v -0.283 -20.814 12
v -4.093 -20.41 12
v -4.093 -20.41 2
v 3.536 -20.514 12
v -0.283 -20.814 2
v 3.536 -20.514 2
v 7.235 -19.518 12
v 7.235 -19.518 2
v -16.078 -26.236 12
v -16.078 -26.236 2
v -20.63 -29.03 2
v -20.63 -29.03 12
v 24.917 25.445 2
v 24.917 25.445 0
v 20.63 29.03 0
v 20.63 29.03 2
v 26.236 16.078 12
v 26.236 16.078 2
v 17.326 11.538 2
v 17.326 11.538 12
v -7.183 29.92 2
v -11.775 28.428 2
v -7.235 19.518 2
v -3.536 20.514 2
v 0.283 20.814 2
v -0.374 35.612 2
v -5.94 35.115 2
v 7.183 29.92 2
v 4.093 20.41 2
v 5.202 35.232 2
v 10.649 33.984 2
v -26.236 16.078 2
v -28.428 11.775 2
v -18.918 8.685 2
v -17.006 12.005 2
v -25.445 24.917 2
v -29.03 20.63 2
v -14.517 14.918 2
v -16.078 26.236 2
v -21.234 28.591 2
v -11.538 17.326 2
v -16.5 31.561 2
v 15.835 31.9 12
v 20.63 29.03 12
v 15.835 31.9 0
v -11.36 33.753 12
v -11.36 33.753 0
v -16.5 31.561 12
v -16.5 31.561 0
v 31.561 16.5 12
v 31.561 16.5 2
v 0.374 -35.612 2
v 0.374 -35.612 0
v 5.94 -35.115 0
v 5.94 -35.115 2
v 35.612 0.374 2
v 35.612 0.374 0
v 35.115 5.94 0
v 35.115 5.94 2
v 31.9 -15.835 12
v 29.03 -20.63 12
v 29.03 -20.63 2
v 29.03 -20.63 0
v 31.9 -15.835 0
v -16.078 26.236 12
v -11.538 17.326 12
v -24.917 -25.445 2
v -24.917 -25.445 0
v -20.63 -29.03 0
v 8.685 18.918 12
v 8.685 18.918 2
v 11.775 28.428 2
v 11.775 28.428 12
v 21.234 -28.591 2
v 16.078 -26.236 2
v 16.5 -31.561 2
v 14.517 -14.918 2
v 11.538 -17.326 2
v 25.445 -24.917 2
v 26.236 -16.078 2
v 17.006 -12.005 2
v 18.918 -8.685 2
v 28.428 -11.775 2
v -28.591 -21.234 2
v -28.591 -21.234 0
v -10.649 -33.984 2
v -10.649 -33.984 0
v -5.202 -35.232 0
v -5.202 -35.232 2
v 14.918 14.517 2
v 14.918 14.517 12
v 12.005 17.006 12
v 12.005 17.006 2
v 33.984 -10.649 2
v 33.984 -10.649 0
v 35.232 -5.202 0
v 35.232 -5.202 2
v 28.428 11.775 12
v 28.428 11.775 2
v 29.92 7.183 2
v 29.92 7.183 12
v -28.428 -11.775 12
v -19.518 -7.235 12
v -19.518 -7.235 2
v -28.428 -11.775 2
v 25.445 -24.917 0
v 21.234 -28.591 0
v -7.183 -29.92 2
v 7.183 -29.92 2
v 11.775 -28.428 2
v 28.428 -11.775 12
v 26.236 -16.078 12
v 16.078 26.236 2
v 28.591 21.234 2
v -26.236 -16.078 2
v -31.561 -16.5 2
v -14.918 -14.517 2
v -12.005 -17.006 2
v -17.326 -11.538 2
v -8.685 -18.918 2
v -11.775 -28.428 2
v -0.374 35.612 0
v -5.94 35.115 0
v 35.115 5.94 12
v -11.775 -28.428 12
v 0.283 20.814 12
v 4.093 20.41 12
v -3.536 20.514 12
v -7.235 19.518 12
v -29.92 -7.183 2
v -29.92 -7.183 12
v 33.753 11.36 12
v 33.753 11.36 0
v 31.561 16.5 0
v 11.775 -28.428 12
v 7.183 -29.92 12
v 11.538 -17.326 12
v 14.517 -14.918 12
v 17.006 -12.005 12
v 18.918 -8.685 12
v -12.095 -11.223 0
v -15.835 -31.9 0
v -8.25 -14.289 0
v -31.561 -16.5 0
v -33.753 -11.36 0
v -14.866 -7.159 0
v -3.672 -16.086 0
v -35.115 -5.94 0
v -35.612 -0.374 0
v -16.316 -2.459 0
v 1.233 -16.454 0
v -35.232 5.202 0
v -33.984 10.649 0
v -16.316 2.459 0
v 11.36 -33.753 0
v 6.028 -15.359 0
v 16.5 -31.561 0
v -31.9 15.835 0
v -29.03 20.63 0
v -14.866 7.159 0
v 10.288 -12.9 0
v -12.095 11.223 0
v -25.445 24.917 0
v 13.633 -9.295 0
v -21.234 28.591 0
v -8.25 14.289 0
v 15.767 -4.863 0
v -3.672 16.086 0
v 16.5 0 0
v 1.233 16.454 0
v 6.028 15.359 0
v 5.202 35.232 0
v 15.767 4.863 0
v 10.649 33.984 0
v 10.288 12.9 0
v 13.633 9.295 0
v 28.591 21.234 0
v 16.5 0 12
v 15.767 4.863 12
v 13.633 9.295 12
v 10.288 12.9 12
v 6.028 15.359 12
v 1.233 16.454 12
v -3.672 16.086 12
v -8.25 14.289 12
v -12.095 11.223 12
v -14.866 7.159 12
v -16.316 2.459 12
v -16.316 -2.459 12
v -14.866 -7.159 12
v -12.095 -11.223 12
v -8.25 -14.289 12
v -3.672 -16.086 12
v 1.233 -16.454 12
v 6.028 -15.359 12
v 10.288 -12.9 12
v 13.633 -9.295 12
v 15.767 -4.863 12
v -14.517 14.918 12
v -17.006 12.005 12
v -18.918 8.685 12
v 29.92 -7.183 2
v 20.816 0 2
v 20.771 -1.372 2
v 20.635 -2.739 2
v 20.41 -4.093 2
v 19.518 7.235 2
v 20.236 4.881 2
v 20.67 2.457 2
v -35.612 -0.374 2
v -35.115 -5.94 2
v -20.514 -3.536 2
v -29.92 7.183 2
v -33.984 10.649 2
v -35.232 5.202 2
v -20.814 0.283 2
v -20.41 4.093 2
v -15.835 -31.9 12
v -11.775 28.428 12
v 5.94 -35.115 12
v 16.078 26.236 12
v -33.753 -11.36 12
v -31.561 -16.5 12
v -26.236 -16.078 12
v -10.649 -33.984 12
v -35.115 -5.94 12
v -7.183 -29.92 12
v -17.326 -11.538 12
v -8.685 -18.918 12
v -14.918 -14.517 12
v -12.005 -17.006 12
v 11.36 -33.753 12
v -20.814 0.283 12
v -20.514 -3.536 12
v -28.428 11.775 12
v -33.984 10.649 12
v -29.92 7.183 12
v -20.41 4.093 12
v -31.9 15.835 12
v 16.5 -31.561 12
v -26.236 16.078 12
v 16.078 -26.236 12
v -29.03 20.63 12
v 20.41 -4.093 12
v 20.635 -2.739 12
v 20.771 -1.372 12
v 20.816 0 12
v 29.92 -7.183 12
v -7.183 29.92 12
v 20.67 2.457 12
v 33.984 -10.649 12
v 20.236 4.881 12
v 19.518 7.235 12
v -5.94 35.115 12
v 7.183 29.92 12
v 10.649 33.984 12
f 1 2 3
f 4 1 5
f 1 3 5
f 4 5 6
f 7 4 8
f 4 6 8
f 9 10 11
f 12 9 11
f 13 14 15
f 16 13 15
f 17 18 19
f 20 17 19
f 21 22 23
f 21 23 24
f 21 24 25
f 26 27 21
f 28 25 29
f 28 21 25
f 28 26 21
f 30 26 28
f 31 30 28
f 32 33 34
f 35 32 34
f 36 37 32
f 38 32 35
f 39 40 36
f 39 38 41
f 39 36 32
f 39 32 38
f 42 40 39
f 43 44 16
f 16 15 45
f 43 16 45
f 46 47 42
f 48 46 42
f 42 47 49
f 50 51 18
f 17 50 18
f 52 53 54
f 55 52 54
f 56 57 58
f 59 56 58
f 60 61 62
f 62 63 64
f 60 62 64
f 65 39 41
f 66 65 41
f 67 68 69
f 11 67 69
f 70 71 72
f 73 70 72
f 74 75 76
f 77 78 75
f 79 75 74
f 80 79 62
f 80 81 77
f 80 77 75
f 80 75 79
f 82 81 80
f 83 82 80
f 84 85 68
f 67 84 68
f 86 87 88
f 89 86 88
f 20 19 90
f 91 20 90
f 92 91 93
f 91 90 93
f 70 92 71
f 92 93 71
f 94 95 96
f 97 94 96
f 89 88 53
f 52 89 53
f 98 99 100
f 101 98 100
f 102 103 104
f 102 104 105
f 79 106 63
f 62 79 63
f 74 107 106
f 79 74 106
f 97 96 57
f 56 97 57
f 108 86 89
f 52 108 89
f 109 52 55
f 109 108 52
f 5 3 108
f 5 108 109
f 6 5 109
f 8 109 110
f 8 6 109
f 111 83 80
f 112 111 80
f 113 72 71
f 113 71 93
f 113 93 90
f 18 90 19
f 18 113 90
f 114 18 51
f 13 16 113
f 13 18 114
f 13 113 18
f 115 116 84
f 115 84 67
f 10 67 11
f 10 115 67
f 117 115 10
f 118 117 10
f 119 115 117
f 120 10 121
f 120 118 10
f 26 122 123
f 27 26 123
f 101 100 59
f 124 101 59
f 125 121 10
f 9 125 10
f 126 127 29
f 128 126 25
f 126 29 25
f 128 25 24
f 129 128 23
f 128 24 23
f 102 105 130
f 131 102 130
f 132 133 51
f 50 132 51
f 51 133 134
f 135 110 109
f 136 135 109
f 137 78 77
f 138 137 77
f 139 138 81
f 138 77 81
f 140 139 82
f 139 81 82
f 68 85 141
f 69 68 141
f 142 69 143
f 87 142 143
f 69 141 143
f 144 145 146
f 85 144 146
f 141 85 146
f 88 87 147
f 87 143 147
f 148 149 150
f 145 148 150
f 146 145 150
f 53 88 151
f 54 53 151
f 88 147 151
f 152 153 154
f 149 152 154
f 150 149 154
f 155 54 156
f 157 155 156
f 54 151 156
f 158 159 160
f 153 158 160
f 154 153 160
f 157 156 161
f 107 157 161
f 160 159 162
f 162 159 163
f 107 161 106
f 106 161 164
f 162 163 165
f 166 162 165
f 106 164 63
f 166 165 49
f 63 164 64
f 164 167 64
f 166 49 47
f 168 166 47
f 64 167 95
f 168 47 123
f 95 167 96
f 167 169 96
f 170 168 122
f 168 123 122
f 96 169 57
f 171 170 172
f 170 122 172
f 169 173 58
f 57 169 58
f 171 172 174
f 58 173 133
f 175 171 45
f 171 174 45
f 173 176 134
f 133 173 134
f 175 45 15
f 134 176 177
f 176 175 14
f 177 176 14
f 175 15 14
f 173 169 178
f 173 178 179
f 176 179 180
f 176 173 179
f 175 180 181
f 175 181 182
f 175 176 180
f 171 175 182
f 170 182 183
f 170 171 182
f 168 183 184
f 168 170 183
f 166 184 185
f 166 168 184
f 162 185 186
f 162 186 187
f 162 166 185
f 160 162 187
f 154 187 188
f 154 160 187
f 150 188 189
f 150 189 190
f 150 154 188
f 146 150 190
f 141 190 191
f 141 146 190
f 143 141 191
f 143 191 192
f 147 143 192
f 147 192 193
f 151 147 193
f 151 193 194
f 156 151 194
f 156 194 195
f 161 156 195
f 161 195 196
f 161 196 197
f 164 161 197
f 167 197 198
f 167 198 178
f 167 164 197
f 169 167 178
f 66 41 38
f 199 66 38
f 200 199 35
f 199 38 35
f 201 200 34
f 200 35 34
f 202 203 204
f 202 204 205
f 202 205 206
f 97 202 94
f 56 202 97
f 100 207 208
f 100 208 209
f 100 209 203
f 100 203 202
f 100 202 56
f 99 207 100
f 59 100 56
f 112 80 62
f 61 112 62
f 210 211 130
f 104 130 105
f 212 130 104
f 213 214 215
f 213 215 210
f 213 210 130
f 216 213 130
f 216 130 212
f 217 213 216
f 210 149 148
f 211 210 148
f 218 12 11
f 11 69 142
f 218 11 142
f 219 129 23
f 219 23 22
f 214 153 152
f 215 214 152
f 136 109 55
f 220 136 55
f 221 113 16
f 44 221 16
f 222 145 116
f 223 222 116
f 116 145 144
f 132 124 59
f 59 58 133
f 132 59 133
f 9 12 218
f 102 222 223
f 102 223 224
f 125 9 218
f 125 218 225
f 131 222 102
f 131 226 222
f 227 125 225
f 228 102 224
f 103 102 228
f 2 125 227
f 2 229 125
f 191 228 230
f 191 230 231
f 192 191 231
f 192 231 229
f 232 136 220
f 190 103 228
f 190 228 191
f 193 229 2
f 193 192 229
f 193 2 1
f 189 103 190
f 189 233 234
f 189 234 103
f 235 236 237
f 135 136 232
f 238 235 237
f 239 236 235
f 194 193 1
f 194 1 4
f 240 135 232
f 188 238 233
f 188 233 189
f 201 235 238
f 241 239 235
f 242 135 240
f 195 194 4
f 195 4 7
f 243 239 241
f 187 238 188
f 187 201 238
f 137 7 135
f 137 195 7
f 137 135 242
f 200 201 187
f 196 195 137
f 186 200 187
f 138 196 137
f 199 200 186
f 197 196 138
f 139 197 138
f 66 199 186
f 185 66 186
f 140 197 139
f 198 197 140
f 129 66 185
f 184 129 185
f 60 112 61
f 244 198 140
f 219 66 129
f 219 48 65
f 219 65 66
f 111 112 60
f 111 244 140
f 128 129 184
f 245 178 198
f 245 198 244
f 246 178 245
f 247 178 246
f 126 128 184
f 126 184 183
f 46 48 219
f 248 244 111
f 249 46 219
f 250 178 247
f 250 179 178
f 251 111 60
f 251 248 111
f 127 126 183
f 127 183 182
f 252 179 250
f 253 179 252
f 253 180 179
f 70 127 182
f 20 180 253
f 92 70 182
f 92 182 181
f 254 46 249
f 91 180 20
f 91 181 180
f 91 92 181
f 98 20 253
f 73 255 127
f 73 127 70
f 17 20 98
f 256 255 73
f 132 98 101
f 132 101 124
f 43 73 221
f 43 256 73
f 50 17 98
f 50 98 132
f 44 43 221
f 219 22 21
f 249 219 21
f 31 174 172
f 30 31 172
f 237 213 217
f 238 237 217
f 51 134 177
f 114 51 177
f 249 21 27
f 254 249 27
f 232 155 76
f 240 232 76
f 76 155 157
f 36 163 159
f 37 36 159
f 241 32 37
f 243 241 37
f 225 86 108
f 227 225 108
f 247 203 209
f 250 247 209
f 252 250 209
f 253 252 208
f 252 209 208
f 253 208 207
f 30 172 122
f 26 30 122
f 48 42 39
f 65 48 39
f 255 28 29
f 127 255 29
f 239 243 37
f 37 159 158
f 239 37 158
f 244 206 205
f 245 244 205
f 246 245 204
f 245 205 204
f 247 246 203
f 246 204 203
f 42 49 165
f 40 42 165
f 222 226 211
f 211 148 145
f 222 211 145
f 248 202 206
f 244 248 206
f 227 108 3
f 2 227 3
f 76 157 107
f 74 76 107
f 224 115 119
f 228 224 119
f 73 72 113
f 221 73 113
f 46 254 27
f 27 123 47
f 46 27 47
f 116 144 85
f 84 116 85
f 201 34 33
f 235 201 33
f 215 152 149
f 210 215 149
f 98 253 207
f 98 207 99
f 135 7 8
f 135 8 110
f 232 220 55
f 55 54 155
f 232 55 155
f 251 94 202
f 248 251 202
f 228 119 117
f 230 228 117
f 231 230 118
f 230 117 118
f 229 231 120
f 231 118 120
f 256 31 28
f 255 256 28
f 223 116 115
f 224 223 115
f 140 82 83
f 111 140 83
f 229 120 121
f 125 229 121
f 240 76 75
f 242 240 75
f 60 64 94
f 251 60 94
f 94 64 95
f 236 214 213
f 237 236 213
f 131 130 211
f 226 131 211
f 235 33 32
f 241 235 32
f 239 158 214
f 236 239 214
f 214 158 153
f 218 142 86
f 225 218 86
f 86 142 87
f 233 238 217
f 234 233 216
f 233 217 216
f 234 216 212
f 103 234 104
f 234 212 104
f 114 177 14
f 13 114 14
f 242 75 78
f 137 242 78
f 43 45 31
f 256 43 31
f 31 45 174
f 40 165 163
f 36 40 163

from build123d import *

# Parameters (mm, degrees)
F0_R      = 16.5
F17_DEPTH = 12
F18_DEPTH = 2


with BuildPart() as f17:
    # F0 (on Top) → F17 (new body)
    with BuildSketch(Plane.XY):
        with BuildLine():
            ThreePointArc((18.917614, -8.685167), (19.797247, -6.432516), (20.409685, -4.093046))
            ThreePointArc((20.409685, -4.093046), (20.714215, -2.056585), (20.816058, 0))
            ThreePointArc((20.816058, 0), (20.489002, 3.675464), (19.518114, 7.235432))
            ThreePointArc((19.518114, 7.235432), (18.547243, 9.450292), (17.326047, 11.537605))
            ThreePointArc((17.326047, 11.537605), (13.518948, 15.828654), (8.685167, 18.917614))
            ThreePointArc((8.685167, 18.917614), (6.432516, 19.797247), (4.093046, 20.409685))
            ThreePointArc((4.093046, 20.409685), (-1.633209, 20.751889), (-7.235432, 19.518114))
            ThreePointArc((-7.235432, 19.518114), (-9.450292, 18.547243), (-11.537605, 17.326047))
            ThreePointArc((-11.537605, 17.326047), (-15.828654, 13.518948), (-18.917614, 8.685167))
            ThreePointArc((-18.917614, 8.685167), (-19.797247, 6.432516), (-20.409685, 4.093046))
            ThreePointArc((-20.409685, 4.093046), (-20.751889, -1.633209), (-19.518114, -7.235432))
            ThreePointArc((-19.518114, -7.235432), (-18.547243, -9.450292), (-17.326047, -11.537605))
            ThreePointArc((-17.326047, -11.537605), (-13.518948, -15.828654), (-8.685167, -18.917614))
            ThreePointArc((-8.685167, -18.917614), (-6.432516, -19.797247), (-4.093046, -20.409685))
            ThreePointArc((-4.093046, -20.409685), (1.633209, -20.751889), (7.235432, -19.518114))
            ThreePointArc((7.235432, -19.518114), (9.450292, -18.547243), (11.537605, -17.326047))
            ThreePointArc((11.537605, -17.326047), (15.828654, -13.518948), (18.917614, -8.685167))
        make_face()
        Circle(F0_R, mode=Mode.SUBTRACT)
        with BuildLine():
            ThreePointArc((4.093046, 20.409685), (6.432516, 19.797247), (8.685167, 18.917614))
            Line((8.685167, 18.917614), (11.775337, 28.428179))
            Line((11.775337, 28.428179), (7.183216, 29.92025))
            Line((7.183216, 29.92025), (4.093046, 20.409685))
        make_face()
        Polygon((11.775337, 28.428179), (16.07751, 26.236113), (20.629834, 29.030011), (15.834552, 31.89982), (10.649371, 33.98415), (7.183216, 29.92025), align=None)
        Polygon((-16.07751, 26.236113), (-11.775337, 28.428179), (-7.183216, 29.92025), (-5.939822, 35.114813), (-11.35986, 33.753298), (-16.50018, 31.560666), align=None)
        with BuildLine():
            ThreePointArc((-11.537605, 17.326047), (-9.450292, 18.547243), (-7.235432, 19.518114))
            Line((-7.235432, 19.518114), (-11.775337, 28.428179))
            Line((-11.775337, 28.428179), (-16.07751, 26.236113))
            Line((-16.07751, 26.236113), (-11.537605, 17.326047))
        make_face()
        Polygon((-29.92025, 7.183216), (-28.428179, 11.775337), (-26.236113, 16.07751), (-29.030011, 20.629834), (-31.89982, 15.834552), (-33.98415, 10.649371), align=None)
        with BuildLine():
            ThreePointArc((-20.409685, 4.093046), (-19.797247, 6.432516), (-18.917614, 8.685167))
            Line((-18.917614, 8.685167), (-28.428179, 11.775337))
            Line((-28.428179, 11.775337), (-29.92025, 7.183216))
            Line((-29.92025, 7.183216), (-20.409685, 4.093046))
        make_face()
        Polygon((-31.560666, -16.50018), (-26.236113, -16.07751), (-28.428179, -11.775337), (-29.92025, -7.183216), (-35.114813, -5.939822), (-33.753298, -11.35986), align=None)
        with BuildLine():
            Line((-26.236113, -16.07751), (-17.326047, -11.537605))
            ThreePointArc((-17.326047, -11.537605), (-18.547243, -9.450292), (-19.518114, -7.235432))
            Line((-19.518114, -7.235432), (-28.428179, -11.775337))
            Line((-28.428179, -11.775337), (-26.236113, -16.07751))
        make_face()
        Polygon((-10.649371, -33.98415), (-7.183216, -29.92025), (-11.775337, -28.428179), (-16.07751, -26.236113), (-20.629834, -29.030011), (-15.834552, -31.89982), align=None)
        with BuildLine():
            Line((-7.183216, -29.92025), (-4.093046, -20.409685))
            ThreePointArc((-4.093046, -20.409685), (-6.432516, -19.797247), (-8.685167, -18.917614))
            Line((-8.685167, -18.917614), (-11.775337, -28.428179))
            Line((-11.775337, -28.428179), (-7.183216, -29.92025))
        make_face()
        Polygon((16.50018, -31.560666), (16.07751, -26.236113), (11.775337, -28.428179), (7.183216, -29.92025), (5.939822, -35.114813), (11.35986, -33.753298), align=None)
        with BuildLine():
            Line((16.07751, -26.236113), (11.537605, -17.326047))
            ThreePointArc((11.537605, -17.326047), (9.450292, -18.547243), (7.235432, -19.518114))
            Line((7.235432, -19.518114), (11.775337, -28.428179))
            Line((11.775337, -28.428179), (16.07751, -26.236113))
        make_face()
        Polygon((33.98415, -10.649371), (29.92025, -7.183216), (28.428179, -11.775337), (26.236113, -16.07751), (29.030011, -20.629834), (31.89982, -15.834552), align=None)
        with BuildLine():
            Line((28.428179, -11.775337), (29.92025, -7.183216))
            Line((29.92025, -7.183216), (20.409685, -4.093046))
            ThreePointArc((20.409685, -4.093046), (19.797247, -6.432516), (18.917614, -8.685167))
            Line((18.917614, -8.685167), (28.428179, -11.775337))
        make_face()
        Polygon((28.428179, 11.775337), (29.92025, 7.183216), (35.114813, 5.939822), (33.753298, 11.35986), (31.560666, 16.50018), (26.236113, 16.07751), align=None)
        with BuildLine():
            Line((19.518114, 7.235432), (28.428179, 11.775337))
            Line((28.428179, 11.775337), (26.236113, 16.07751))
            Line((26.236113, 16.07751), (17.326047, 11.537605))
            ThreePointArc((17.326047, 11.537605), (18.547243, 9.450292), (19.518114, 7.235432))
        make_face()
    extrude(amount=F17_DEPTH)

    # F9 (on face) + F10 (on face) + F11 (on face) + F7 (on face) + F8 (on face) + F1 (on face) + F2 (on face) + F16 (on face) + F15 (on face) + F3 (on face) + F14 (on face) + F4 (on face) + F13 (on face) + F5 (on face) + F12 (on face) + F6 (on face) → F18 (join)
    with BuildSketch(Plane.XY):
        Polygon((-23.398026, 19.983802), (-19.983802, 23.398026), (-16.07751, 26.236113), (-16.50018, 31.560666), (-21.234212, 28.590905), (-25.445386, 24.917141), (-29.030011, 20.629834), (-26.236113, 16.07751), align=None)
    with BuildSketch(Plane.XY):
        Polygon((-2.414221, 30.675584), (2.414221, 30.675584), (7.183216, 29.92025), (10.649371, 33.98415), (5.201968, 35.231677), (-0.373526, 35.611684), (-5.939822, 35.114813), (-7.183216, 29.92025), align=None)
    with BuildSketch(Plane.XY):
        Polygon((19.983802, 23.398026), (23.398026, 19.983802), (26.236113, 16.07751), (31.560666, 16.50018), (28.590905, 21.234212), (24.917141, 25.445386), (20.629834, 29.030011), (16.07751, 26.236113), align=None)
    with BuildSketch(Plane.XY):
        with BuildLine():
            ThreePointArc((8.685167, 18.917614), (13.518948, 15.828654), (17.326047, 11.537605))
            Line((17.326047, 11.537605), (26.236113, 16.07751))
            Line((26.236113, 16.07751), (23.398026, 19.983802))
            Line((23.398026, 19.983802), (19.983802, 23.398026))
            Line((19.983802, 23.398026), (16.07751, 26.236113))
            Line((16.07751, 26.236113), (11.775337, 28.428179))
            Line((11.775337, 28.428179), (8.685167, 18.917614))
        make_face()
    with BuildSketch(Plane.XY):
        with BuildLine():
            Line((-11.775337, 28.428179), (-7.235432, 19.518114))
            ThreePointArc((-7.235432, 19.518114), (-1.633209, 20.751889), (4.093046, 20.409685))
            Line((4.093046, 20.409685), (7.183216, 29.92025))
            Line((7.183216, 29.92025), (2.414221, 30.675584))
            Line((2.414221, 30.675584), (-2.414221, 30.675584))
            Line((-2.414221, 30.675584), (-7.183216, 29.92025))
            Line((-7.183216, 29.92025), (-11.775337, 28.428179))
        make_face()
    with BuildSketch(Plane.XY):
        with BuildLine():
            Line((-28.428179, 11.775337), (-18.917614, 8.685167))
            ThreePointArc((-18.917614, 8.685167), (-15.828654, 13.518948), (-11.537605, 17.326047))
            Line((-11.537605, 17.326047), (-16.07751, 26.236113))
            Line((-16.07751, 26.236113), (-19.983802, 23.398026))
            Line((-19.983802, 23.398026), (-23.398026, 19.983802))
            Line((-23.398026, 19.983802), (-26.236113, 16.07751))
            Line((-26.236113, 16.07751), (-28.428179, 11.775337))
        make_face()
    with BuildSketch(Plane.XY):
        with BuildLine():
            Line((-29.92025, -7.183216), (-28.428179, -11.775337))
            Line((-28.428179, -11.775337), (-19.518114, -7.235432))
            ThreePointArc((-19.518114, -7.235432), (-20.751889, -1.633209), (-20.409685, 4.093046))
            Line((-20.409685, 4.093046), (-29.92025, 7.183216))
            Line((-29.92025, 7.183216), (-30.675584, 2.414221))
            Line((-30.675584, 2.414221), (-30.675584, -2.414221))
            Line((-30.675584, -2.414221), (-29.92025, -7.183216))
        make_face()
    with BuildSketch(Plane.XY):
        Polygon((-30.675584, -2.414221), (-30.675584, 2.414221), (-29.92025, 7.183216), (-33.98415, 10.649371), (-35.231677, 5.201968), (-35.611684, -0.373526), (-35.114813, -5.939822), (-29.92025, -7.183216), align=None)
    with BuildSketch(Plane.XY):
        Polygon((-19.983802, -23.398026), (-23.398026, -19.983802), (-26.236113, -16.07751), (-31.560666, -16.50018), (-28.590905, -21.234212), (-24.917141, -25.445386), (-20.629834, -29.030011), (-16.07751, -26.236113), align=None)
    with BuildSketch(Plane.XY):
        with BuildLine():
            Line((-16.07751, -26.236113), (-11.775337, -28.428179))
            Line((-11.775337, -28.428179), (-8.685167, -18.917614))
            ThreePointArc((-8.685167, -18.917614), (-13.518948, -15.828654), (-17.326047, -11.537605))
            Line((-17.326047, -11.537605), (-26.236113, -16.07751))
            Line((-26.236113, -16.07751), (-23.398026, -19.983802))
            Line((-23.398026, -19.983802), (-19.983802, -23.398026))
            Line((-19.983802, -23.398026), (-16.07751, -26.236113))
        make_face()
    with BuildSketch(Plane.XY):
        Polygon((2.414221, -30.675584), (-2.414221, -30.675584), (-7.183216, -29.92025), (-10.649371, -33.98415), (-5.201968, -35.231677), (0.373526, -35.611684), (5.939822, -35.114813), (7.183216, -29.92025), align=None)
    with BuildSketch(Plane.XY):
        with BuildLine():
            Line((7.183216, -29.92025), (11.775337, -28.428179))
            Line((11.775337, -28.428179), (7.235432, -19.518114))
            ThreePointArc((7.235432, -19.518114), (1.633209, -20.751889), (-4.093046, -20.409685))
            Line((-4.093046, -20.409685), (-7.183216, -29.92025))
            Line((-7.183216, -29.92025), (-2.414221, -30.675584))
            Line((-2.414221, -30.675584), (2.414221, -30.675584))
            Line((2.414221, -30.675584), (7.183216, -29.92025))
        make_face()
    with BuildSketch(Plane.XY):
        Polygon((25.445386, -24.917141), (29.030011, -20.629834), (26.236113, -16.07751), (23.398026, -19.983802), (19.983802, -23.398026), (16.07751, -26.236113), (16.50018, -31.560666), (21.234212, -28.590905), align=None)
    with BuildSketch(Plane.XY):
        with BuildLine():
            Line((23.398026, -19.983802), (26.236113, -16.07751))
            Line((26.236113, -16.07751), (28.428179, -11.775337))
            Line((28.428179, -11.775337), (18.917614, -8.685167))
            ThreePointArc((18.917614, -8.685167), (15.828654, -13.518948), (11.537605, -17.326047))
            Line((11.537605, -17.326047), (16.07751, -26.236113))
            Line((16.07751, -26.236113), (19.983802, -23.398026))
            Line((19.983802, -23.398026), (23.398026, -19.983802))
        make_face()
    with BuildSketch(Plane.XY):
        Polygon((35.114813, 5.939822), (29.92025, 7.183216), (30.675584, 2.414221), (30.675584, -2.414221), (29.92025, -7.183216), (33.98415, -10.649371), (35.231677, -5.201968), (35.611684, 0.373526), align=None)
    with BuildSketch(Plane.XY):
        with BuildLine():
            Line((29.92025, -7.183216), (30.675584, -2.414221))
            Line((30.675584, -2.414221), (30.675584, 2.414221))
            Line((30.675584, 2.414221), (29.92025, 7.183216))
            Line((29.92025, 7.183216), (28.428179, 11.775337))
            Line((28.428179, 11.775337), (19.518114, 7.235432))
            ThreePointArc((19.518114, 7.235432), (20.489002, 3.675464), (20.816058, 0))
            ThreePointArc((20.816058, 0), (20.714215, -2.056585), (20.409685, -4.093046))
            Line((20.409685, -4.093046), (29.92025, -7.183216))
        make_face()
    extrude(amount=F18_DEPTH)


solid = f17.part
